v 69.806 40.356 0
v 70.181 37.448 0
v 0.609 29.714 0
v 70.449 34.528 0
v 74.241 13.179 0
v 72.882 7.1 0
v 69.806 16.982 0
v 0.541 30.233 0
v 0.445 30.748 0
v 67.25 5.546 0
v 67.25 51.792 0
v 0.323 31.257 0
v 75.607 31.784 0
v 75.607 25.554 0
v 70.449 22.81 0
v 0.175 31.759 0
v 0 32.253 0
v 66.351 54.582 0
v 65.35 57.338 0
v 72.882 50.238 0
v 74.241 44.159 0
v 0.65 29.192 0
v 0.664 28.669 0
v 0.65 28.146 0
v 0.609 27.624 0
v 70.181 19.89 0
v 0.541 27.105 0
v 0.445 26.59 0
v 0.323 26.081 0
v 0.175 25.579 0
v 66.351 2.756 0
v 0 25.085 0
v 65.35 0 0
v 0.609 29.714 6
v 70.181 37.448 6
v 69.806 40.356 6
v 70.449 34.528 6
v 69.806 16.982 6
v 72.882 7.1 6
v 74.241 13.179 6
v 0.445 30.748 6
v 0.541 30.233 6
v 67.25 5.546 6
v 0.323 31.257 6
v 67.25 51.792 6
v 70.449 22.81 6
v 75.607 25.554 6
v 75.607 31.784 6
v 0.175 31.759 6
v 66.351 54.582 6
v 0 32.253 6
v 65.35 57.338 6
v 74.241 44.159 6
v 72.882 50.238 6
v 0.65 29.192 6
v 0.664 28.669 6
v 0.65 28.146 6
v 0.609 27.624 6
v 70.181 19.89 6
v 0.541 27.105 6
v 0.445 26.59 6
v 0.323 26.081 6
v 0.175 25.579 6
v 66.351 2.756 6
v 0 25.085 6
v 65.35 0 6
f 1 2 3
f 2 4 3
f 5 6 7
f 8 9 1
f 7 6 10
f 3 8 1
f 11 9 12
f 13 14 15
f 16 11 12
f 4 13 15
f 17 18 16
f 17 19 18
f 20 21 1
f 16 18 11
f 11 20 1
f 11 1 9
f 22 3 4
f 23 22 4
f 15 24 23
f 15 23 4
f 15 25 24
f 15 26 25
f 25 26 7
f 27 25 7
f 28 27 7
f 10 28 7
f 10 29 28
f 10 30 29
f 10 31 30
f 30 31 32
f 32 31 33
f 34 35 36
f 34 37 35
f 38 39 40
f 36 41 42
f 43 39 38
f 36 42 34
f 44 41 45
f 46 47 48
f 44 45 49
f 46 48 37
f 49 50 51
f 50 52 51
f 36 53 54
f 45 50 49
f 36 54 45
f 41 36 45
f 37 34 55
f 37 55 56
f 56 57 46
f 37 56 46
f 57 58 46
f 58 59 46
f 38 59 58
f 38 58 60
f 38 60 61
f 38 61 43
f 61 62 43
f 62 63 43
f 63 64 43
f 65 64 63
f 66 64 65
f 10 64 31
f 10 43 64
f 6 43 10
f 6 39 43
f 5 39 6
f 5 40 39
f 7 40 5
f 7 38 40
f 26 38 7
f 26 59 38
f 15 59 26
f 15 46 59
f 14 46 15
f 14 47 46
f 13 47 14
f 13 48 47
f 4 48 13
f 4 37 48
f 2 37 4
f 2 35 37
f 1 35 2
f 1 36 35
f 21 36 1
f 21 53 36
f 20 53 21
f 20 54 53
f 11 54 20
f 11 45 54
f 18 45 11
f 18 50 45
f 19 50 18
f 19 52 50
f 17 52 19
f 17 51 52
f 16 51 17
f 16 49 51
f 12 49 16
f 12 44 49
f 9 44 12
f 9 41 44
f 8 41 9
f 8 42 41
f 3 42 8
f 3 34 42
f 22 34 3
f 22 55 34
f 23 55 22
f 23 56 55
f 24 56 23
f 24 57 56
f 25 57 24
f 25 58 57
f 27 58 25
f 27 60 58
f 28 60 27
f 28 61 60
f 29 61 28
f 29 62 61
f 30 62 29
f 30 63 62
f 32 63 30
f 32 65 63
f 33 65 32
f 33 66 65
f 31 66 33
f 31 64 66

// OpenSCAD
$fn = 32;

// ----------------------------------------------------------------------
// Gear sector: 3 teeth on 42 degrees
// ----------------------------------------------------------------------

// --- parameters (mm) ---
sector_angle = 42;        // sector angle, degrees
root_r = 80;              // root circle radius
tooth_h = 5;              // tooth height over the root circle
teeth = 3;                // number of teeth on the sector
hub_r = 10;               // hub bore radius
plate_t = 6;              // sector thickness, Z
arc_step = 3;             // sampling step of the root/hub arcs, degrees
fit_tol = 0.05;           // declared fit tolerance (prompt contract)
free_tol = 0.3;           // declared free tolerance (prompt contract)

tip_r = root_r + tooth_h;  // tip circle radius

profile = [[65.35, 0], [66.351, 2.756], [67.25, 5.546], [72.882, 7.1], [74.241, 13.179], [69.806, 16.982], [70.181, 19.89], [70.449, 22.81], [75.607, 25.554], [75.607, 31.784], [70.449, 34.528], [70.181, 37.448], [69.806, 40.356], [74.241, 44.159], [72.882, 50.238], [67.25, 51.792], [66.351, 54.582], [65.35, 57.338], [0, 32.253], [0.175, 31.759], [0.323, 31.257], [0.445, 30.748], [0.541, 30.233], [0.609, 29.714], [0.65, 29.192], [0.664, 28.669], [0.65, 28.146], [0.609, 27.624], [0.541, 27.105], [0.445, 26.59], [0.323, 26.081], [0.175, 25.579], [0, 25.085]];  // primary outline, 33 points, counter clockwise

// --- the one profile operation ---
linear_extrude(height = plate_t) polygon(points = profile);
